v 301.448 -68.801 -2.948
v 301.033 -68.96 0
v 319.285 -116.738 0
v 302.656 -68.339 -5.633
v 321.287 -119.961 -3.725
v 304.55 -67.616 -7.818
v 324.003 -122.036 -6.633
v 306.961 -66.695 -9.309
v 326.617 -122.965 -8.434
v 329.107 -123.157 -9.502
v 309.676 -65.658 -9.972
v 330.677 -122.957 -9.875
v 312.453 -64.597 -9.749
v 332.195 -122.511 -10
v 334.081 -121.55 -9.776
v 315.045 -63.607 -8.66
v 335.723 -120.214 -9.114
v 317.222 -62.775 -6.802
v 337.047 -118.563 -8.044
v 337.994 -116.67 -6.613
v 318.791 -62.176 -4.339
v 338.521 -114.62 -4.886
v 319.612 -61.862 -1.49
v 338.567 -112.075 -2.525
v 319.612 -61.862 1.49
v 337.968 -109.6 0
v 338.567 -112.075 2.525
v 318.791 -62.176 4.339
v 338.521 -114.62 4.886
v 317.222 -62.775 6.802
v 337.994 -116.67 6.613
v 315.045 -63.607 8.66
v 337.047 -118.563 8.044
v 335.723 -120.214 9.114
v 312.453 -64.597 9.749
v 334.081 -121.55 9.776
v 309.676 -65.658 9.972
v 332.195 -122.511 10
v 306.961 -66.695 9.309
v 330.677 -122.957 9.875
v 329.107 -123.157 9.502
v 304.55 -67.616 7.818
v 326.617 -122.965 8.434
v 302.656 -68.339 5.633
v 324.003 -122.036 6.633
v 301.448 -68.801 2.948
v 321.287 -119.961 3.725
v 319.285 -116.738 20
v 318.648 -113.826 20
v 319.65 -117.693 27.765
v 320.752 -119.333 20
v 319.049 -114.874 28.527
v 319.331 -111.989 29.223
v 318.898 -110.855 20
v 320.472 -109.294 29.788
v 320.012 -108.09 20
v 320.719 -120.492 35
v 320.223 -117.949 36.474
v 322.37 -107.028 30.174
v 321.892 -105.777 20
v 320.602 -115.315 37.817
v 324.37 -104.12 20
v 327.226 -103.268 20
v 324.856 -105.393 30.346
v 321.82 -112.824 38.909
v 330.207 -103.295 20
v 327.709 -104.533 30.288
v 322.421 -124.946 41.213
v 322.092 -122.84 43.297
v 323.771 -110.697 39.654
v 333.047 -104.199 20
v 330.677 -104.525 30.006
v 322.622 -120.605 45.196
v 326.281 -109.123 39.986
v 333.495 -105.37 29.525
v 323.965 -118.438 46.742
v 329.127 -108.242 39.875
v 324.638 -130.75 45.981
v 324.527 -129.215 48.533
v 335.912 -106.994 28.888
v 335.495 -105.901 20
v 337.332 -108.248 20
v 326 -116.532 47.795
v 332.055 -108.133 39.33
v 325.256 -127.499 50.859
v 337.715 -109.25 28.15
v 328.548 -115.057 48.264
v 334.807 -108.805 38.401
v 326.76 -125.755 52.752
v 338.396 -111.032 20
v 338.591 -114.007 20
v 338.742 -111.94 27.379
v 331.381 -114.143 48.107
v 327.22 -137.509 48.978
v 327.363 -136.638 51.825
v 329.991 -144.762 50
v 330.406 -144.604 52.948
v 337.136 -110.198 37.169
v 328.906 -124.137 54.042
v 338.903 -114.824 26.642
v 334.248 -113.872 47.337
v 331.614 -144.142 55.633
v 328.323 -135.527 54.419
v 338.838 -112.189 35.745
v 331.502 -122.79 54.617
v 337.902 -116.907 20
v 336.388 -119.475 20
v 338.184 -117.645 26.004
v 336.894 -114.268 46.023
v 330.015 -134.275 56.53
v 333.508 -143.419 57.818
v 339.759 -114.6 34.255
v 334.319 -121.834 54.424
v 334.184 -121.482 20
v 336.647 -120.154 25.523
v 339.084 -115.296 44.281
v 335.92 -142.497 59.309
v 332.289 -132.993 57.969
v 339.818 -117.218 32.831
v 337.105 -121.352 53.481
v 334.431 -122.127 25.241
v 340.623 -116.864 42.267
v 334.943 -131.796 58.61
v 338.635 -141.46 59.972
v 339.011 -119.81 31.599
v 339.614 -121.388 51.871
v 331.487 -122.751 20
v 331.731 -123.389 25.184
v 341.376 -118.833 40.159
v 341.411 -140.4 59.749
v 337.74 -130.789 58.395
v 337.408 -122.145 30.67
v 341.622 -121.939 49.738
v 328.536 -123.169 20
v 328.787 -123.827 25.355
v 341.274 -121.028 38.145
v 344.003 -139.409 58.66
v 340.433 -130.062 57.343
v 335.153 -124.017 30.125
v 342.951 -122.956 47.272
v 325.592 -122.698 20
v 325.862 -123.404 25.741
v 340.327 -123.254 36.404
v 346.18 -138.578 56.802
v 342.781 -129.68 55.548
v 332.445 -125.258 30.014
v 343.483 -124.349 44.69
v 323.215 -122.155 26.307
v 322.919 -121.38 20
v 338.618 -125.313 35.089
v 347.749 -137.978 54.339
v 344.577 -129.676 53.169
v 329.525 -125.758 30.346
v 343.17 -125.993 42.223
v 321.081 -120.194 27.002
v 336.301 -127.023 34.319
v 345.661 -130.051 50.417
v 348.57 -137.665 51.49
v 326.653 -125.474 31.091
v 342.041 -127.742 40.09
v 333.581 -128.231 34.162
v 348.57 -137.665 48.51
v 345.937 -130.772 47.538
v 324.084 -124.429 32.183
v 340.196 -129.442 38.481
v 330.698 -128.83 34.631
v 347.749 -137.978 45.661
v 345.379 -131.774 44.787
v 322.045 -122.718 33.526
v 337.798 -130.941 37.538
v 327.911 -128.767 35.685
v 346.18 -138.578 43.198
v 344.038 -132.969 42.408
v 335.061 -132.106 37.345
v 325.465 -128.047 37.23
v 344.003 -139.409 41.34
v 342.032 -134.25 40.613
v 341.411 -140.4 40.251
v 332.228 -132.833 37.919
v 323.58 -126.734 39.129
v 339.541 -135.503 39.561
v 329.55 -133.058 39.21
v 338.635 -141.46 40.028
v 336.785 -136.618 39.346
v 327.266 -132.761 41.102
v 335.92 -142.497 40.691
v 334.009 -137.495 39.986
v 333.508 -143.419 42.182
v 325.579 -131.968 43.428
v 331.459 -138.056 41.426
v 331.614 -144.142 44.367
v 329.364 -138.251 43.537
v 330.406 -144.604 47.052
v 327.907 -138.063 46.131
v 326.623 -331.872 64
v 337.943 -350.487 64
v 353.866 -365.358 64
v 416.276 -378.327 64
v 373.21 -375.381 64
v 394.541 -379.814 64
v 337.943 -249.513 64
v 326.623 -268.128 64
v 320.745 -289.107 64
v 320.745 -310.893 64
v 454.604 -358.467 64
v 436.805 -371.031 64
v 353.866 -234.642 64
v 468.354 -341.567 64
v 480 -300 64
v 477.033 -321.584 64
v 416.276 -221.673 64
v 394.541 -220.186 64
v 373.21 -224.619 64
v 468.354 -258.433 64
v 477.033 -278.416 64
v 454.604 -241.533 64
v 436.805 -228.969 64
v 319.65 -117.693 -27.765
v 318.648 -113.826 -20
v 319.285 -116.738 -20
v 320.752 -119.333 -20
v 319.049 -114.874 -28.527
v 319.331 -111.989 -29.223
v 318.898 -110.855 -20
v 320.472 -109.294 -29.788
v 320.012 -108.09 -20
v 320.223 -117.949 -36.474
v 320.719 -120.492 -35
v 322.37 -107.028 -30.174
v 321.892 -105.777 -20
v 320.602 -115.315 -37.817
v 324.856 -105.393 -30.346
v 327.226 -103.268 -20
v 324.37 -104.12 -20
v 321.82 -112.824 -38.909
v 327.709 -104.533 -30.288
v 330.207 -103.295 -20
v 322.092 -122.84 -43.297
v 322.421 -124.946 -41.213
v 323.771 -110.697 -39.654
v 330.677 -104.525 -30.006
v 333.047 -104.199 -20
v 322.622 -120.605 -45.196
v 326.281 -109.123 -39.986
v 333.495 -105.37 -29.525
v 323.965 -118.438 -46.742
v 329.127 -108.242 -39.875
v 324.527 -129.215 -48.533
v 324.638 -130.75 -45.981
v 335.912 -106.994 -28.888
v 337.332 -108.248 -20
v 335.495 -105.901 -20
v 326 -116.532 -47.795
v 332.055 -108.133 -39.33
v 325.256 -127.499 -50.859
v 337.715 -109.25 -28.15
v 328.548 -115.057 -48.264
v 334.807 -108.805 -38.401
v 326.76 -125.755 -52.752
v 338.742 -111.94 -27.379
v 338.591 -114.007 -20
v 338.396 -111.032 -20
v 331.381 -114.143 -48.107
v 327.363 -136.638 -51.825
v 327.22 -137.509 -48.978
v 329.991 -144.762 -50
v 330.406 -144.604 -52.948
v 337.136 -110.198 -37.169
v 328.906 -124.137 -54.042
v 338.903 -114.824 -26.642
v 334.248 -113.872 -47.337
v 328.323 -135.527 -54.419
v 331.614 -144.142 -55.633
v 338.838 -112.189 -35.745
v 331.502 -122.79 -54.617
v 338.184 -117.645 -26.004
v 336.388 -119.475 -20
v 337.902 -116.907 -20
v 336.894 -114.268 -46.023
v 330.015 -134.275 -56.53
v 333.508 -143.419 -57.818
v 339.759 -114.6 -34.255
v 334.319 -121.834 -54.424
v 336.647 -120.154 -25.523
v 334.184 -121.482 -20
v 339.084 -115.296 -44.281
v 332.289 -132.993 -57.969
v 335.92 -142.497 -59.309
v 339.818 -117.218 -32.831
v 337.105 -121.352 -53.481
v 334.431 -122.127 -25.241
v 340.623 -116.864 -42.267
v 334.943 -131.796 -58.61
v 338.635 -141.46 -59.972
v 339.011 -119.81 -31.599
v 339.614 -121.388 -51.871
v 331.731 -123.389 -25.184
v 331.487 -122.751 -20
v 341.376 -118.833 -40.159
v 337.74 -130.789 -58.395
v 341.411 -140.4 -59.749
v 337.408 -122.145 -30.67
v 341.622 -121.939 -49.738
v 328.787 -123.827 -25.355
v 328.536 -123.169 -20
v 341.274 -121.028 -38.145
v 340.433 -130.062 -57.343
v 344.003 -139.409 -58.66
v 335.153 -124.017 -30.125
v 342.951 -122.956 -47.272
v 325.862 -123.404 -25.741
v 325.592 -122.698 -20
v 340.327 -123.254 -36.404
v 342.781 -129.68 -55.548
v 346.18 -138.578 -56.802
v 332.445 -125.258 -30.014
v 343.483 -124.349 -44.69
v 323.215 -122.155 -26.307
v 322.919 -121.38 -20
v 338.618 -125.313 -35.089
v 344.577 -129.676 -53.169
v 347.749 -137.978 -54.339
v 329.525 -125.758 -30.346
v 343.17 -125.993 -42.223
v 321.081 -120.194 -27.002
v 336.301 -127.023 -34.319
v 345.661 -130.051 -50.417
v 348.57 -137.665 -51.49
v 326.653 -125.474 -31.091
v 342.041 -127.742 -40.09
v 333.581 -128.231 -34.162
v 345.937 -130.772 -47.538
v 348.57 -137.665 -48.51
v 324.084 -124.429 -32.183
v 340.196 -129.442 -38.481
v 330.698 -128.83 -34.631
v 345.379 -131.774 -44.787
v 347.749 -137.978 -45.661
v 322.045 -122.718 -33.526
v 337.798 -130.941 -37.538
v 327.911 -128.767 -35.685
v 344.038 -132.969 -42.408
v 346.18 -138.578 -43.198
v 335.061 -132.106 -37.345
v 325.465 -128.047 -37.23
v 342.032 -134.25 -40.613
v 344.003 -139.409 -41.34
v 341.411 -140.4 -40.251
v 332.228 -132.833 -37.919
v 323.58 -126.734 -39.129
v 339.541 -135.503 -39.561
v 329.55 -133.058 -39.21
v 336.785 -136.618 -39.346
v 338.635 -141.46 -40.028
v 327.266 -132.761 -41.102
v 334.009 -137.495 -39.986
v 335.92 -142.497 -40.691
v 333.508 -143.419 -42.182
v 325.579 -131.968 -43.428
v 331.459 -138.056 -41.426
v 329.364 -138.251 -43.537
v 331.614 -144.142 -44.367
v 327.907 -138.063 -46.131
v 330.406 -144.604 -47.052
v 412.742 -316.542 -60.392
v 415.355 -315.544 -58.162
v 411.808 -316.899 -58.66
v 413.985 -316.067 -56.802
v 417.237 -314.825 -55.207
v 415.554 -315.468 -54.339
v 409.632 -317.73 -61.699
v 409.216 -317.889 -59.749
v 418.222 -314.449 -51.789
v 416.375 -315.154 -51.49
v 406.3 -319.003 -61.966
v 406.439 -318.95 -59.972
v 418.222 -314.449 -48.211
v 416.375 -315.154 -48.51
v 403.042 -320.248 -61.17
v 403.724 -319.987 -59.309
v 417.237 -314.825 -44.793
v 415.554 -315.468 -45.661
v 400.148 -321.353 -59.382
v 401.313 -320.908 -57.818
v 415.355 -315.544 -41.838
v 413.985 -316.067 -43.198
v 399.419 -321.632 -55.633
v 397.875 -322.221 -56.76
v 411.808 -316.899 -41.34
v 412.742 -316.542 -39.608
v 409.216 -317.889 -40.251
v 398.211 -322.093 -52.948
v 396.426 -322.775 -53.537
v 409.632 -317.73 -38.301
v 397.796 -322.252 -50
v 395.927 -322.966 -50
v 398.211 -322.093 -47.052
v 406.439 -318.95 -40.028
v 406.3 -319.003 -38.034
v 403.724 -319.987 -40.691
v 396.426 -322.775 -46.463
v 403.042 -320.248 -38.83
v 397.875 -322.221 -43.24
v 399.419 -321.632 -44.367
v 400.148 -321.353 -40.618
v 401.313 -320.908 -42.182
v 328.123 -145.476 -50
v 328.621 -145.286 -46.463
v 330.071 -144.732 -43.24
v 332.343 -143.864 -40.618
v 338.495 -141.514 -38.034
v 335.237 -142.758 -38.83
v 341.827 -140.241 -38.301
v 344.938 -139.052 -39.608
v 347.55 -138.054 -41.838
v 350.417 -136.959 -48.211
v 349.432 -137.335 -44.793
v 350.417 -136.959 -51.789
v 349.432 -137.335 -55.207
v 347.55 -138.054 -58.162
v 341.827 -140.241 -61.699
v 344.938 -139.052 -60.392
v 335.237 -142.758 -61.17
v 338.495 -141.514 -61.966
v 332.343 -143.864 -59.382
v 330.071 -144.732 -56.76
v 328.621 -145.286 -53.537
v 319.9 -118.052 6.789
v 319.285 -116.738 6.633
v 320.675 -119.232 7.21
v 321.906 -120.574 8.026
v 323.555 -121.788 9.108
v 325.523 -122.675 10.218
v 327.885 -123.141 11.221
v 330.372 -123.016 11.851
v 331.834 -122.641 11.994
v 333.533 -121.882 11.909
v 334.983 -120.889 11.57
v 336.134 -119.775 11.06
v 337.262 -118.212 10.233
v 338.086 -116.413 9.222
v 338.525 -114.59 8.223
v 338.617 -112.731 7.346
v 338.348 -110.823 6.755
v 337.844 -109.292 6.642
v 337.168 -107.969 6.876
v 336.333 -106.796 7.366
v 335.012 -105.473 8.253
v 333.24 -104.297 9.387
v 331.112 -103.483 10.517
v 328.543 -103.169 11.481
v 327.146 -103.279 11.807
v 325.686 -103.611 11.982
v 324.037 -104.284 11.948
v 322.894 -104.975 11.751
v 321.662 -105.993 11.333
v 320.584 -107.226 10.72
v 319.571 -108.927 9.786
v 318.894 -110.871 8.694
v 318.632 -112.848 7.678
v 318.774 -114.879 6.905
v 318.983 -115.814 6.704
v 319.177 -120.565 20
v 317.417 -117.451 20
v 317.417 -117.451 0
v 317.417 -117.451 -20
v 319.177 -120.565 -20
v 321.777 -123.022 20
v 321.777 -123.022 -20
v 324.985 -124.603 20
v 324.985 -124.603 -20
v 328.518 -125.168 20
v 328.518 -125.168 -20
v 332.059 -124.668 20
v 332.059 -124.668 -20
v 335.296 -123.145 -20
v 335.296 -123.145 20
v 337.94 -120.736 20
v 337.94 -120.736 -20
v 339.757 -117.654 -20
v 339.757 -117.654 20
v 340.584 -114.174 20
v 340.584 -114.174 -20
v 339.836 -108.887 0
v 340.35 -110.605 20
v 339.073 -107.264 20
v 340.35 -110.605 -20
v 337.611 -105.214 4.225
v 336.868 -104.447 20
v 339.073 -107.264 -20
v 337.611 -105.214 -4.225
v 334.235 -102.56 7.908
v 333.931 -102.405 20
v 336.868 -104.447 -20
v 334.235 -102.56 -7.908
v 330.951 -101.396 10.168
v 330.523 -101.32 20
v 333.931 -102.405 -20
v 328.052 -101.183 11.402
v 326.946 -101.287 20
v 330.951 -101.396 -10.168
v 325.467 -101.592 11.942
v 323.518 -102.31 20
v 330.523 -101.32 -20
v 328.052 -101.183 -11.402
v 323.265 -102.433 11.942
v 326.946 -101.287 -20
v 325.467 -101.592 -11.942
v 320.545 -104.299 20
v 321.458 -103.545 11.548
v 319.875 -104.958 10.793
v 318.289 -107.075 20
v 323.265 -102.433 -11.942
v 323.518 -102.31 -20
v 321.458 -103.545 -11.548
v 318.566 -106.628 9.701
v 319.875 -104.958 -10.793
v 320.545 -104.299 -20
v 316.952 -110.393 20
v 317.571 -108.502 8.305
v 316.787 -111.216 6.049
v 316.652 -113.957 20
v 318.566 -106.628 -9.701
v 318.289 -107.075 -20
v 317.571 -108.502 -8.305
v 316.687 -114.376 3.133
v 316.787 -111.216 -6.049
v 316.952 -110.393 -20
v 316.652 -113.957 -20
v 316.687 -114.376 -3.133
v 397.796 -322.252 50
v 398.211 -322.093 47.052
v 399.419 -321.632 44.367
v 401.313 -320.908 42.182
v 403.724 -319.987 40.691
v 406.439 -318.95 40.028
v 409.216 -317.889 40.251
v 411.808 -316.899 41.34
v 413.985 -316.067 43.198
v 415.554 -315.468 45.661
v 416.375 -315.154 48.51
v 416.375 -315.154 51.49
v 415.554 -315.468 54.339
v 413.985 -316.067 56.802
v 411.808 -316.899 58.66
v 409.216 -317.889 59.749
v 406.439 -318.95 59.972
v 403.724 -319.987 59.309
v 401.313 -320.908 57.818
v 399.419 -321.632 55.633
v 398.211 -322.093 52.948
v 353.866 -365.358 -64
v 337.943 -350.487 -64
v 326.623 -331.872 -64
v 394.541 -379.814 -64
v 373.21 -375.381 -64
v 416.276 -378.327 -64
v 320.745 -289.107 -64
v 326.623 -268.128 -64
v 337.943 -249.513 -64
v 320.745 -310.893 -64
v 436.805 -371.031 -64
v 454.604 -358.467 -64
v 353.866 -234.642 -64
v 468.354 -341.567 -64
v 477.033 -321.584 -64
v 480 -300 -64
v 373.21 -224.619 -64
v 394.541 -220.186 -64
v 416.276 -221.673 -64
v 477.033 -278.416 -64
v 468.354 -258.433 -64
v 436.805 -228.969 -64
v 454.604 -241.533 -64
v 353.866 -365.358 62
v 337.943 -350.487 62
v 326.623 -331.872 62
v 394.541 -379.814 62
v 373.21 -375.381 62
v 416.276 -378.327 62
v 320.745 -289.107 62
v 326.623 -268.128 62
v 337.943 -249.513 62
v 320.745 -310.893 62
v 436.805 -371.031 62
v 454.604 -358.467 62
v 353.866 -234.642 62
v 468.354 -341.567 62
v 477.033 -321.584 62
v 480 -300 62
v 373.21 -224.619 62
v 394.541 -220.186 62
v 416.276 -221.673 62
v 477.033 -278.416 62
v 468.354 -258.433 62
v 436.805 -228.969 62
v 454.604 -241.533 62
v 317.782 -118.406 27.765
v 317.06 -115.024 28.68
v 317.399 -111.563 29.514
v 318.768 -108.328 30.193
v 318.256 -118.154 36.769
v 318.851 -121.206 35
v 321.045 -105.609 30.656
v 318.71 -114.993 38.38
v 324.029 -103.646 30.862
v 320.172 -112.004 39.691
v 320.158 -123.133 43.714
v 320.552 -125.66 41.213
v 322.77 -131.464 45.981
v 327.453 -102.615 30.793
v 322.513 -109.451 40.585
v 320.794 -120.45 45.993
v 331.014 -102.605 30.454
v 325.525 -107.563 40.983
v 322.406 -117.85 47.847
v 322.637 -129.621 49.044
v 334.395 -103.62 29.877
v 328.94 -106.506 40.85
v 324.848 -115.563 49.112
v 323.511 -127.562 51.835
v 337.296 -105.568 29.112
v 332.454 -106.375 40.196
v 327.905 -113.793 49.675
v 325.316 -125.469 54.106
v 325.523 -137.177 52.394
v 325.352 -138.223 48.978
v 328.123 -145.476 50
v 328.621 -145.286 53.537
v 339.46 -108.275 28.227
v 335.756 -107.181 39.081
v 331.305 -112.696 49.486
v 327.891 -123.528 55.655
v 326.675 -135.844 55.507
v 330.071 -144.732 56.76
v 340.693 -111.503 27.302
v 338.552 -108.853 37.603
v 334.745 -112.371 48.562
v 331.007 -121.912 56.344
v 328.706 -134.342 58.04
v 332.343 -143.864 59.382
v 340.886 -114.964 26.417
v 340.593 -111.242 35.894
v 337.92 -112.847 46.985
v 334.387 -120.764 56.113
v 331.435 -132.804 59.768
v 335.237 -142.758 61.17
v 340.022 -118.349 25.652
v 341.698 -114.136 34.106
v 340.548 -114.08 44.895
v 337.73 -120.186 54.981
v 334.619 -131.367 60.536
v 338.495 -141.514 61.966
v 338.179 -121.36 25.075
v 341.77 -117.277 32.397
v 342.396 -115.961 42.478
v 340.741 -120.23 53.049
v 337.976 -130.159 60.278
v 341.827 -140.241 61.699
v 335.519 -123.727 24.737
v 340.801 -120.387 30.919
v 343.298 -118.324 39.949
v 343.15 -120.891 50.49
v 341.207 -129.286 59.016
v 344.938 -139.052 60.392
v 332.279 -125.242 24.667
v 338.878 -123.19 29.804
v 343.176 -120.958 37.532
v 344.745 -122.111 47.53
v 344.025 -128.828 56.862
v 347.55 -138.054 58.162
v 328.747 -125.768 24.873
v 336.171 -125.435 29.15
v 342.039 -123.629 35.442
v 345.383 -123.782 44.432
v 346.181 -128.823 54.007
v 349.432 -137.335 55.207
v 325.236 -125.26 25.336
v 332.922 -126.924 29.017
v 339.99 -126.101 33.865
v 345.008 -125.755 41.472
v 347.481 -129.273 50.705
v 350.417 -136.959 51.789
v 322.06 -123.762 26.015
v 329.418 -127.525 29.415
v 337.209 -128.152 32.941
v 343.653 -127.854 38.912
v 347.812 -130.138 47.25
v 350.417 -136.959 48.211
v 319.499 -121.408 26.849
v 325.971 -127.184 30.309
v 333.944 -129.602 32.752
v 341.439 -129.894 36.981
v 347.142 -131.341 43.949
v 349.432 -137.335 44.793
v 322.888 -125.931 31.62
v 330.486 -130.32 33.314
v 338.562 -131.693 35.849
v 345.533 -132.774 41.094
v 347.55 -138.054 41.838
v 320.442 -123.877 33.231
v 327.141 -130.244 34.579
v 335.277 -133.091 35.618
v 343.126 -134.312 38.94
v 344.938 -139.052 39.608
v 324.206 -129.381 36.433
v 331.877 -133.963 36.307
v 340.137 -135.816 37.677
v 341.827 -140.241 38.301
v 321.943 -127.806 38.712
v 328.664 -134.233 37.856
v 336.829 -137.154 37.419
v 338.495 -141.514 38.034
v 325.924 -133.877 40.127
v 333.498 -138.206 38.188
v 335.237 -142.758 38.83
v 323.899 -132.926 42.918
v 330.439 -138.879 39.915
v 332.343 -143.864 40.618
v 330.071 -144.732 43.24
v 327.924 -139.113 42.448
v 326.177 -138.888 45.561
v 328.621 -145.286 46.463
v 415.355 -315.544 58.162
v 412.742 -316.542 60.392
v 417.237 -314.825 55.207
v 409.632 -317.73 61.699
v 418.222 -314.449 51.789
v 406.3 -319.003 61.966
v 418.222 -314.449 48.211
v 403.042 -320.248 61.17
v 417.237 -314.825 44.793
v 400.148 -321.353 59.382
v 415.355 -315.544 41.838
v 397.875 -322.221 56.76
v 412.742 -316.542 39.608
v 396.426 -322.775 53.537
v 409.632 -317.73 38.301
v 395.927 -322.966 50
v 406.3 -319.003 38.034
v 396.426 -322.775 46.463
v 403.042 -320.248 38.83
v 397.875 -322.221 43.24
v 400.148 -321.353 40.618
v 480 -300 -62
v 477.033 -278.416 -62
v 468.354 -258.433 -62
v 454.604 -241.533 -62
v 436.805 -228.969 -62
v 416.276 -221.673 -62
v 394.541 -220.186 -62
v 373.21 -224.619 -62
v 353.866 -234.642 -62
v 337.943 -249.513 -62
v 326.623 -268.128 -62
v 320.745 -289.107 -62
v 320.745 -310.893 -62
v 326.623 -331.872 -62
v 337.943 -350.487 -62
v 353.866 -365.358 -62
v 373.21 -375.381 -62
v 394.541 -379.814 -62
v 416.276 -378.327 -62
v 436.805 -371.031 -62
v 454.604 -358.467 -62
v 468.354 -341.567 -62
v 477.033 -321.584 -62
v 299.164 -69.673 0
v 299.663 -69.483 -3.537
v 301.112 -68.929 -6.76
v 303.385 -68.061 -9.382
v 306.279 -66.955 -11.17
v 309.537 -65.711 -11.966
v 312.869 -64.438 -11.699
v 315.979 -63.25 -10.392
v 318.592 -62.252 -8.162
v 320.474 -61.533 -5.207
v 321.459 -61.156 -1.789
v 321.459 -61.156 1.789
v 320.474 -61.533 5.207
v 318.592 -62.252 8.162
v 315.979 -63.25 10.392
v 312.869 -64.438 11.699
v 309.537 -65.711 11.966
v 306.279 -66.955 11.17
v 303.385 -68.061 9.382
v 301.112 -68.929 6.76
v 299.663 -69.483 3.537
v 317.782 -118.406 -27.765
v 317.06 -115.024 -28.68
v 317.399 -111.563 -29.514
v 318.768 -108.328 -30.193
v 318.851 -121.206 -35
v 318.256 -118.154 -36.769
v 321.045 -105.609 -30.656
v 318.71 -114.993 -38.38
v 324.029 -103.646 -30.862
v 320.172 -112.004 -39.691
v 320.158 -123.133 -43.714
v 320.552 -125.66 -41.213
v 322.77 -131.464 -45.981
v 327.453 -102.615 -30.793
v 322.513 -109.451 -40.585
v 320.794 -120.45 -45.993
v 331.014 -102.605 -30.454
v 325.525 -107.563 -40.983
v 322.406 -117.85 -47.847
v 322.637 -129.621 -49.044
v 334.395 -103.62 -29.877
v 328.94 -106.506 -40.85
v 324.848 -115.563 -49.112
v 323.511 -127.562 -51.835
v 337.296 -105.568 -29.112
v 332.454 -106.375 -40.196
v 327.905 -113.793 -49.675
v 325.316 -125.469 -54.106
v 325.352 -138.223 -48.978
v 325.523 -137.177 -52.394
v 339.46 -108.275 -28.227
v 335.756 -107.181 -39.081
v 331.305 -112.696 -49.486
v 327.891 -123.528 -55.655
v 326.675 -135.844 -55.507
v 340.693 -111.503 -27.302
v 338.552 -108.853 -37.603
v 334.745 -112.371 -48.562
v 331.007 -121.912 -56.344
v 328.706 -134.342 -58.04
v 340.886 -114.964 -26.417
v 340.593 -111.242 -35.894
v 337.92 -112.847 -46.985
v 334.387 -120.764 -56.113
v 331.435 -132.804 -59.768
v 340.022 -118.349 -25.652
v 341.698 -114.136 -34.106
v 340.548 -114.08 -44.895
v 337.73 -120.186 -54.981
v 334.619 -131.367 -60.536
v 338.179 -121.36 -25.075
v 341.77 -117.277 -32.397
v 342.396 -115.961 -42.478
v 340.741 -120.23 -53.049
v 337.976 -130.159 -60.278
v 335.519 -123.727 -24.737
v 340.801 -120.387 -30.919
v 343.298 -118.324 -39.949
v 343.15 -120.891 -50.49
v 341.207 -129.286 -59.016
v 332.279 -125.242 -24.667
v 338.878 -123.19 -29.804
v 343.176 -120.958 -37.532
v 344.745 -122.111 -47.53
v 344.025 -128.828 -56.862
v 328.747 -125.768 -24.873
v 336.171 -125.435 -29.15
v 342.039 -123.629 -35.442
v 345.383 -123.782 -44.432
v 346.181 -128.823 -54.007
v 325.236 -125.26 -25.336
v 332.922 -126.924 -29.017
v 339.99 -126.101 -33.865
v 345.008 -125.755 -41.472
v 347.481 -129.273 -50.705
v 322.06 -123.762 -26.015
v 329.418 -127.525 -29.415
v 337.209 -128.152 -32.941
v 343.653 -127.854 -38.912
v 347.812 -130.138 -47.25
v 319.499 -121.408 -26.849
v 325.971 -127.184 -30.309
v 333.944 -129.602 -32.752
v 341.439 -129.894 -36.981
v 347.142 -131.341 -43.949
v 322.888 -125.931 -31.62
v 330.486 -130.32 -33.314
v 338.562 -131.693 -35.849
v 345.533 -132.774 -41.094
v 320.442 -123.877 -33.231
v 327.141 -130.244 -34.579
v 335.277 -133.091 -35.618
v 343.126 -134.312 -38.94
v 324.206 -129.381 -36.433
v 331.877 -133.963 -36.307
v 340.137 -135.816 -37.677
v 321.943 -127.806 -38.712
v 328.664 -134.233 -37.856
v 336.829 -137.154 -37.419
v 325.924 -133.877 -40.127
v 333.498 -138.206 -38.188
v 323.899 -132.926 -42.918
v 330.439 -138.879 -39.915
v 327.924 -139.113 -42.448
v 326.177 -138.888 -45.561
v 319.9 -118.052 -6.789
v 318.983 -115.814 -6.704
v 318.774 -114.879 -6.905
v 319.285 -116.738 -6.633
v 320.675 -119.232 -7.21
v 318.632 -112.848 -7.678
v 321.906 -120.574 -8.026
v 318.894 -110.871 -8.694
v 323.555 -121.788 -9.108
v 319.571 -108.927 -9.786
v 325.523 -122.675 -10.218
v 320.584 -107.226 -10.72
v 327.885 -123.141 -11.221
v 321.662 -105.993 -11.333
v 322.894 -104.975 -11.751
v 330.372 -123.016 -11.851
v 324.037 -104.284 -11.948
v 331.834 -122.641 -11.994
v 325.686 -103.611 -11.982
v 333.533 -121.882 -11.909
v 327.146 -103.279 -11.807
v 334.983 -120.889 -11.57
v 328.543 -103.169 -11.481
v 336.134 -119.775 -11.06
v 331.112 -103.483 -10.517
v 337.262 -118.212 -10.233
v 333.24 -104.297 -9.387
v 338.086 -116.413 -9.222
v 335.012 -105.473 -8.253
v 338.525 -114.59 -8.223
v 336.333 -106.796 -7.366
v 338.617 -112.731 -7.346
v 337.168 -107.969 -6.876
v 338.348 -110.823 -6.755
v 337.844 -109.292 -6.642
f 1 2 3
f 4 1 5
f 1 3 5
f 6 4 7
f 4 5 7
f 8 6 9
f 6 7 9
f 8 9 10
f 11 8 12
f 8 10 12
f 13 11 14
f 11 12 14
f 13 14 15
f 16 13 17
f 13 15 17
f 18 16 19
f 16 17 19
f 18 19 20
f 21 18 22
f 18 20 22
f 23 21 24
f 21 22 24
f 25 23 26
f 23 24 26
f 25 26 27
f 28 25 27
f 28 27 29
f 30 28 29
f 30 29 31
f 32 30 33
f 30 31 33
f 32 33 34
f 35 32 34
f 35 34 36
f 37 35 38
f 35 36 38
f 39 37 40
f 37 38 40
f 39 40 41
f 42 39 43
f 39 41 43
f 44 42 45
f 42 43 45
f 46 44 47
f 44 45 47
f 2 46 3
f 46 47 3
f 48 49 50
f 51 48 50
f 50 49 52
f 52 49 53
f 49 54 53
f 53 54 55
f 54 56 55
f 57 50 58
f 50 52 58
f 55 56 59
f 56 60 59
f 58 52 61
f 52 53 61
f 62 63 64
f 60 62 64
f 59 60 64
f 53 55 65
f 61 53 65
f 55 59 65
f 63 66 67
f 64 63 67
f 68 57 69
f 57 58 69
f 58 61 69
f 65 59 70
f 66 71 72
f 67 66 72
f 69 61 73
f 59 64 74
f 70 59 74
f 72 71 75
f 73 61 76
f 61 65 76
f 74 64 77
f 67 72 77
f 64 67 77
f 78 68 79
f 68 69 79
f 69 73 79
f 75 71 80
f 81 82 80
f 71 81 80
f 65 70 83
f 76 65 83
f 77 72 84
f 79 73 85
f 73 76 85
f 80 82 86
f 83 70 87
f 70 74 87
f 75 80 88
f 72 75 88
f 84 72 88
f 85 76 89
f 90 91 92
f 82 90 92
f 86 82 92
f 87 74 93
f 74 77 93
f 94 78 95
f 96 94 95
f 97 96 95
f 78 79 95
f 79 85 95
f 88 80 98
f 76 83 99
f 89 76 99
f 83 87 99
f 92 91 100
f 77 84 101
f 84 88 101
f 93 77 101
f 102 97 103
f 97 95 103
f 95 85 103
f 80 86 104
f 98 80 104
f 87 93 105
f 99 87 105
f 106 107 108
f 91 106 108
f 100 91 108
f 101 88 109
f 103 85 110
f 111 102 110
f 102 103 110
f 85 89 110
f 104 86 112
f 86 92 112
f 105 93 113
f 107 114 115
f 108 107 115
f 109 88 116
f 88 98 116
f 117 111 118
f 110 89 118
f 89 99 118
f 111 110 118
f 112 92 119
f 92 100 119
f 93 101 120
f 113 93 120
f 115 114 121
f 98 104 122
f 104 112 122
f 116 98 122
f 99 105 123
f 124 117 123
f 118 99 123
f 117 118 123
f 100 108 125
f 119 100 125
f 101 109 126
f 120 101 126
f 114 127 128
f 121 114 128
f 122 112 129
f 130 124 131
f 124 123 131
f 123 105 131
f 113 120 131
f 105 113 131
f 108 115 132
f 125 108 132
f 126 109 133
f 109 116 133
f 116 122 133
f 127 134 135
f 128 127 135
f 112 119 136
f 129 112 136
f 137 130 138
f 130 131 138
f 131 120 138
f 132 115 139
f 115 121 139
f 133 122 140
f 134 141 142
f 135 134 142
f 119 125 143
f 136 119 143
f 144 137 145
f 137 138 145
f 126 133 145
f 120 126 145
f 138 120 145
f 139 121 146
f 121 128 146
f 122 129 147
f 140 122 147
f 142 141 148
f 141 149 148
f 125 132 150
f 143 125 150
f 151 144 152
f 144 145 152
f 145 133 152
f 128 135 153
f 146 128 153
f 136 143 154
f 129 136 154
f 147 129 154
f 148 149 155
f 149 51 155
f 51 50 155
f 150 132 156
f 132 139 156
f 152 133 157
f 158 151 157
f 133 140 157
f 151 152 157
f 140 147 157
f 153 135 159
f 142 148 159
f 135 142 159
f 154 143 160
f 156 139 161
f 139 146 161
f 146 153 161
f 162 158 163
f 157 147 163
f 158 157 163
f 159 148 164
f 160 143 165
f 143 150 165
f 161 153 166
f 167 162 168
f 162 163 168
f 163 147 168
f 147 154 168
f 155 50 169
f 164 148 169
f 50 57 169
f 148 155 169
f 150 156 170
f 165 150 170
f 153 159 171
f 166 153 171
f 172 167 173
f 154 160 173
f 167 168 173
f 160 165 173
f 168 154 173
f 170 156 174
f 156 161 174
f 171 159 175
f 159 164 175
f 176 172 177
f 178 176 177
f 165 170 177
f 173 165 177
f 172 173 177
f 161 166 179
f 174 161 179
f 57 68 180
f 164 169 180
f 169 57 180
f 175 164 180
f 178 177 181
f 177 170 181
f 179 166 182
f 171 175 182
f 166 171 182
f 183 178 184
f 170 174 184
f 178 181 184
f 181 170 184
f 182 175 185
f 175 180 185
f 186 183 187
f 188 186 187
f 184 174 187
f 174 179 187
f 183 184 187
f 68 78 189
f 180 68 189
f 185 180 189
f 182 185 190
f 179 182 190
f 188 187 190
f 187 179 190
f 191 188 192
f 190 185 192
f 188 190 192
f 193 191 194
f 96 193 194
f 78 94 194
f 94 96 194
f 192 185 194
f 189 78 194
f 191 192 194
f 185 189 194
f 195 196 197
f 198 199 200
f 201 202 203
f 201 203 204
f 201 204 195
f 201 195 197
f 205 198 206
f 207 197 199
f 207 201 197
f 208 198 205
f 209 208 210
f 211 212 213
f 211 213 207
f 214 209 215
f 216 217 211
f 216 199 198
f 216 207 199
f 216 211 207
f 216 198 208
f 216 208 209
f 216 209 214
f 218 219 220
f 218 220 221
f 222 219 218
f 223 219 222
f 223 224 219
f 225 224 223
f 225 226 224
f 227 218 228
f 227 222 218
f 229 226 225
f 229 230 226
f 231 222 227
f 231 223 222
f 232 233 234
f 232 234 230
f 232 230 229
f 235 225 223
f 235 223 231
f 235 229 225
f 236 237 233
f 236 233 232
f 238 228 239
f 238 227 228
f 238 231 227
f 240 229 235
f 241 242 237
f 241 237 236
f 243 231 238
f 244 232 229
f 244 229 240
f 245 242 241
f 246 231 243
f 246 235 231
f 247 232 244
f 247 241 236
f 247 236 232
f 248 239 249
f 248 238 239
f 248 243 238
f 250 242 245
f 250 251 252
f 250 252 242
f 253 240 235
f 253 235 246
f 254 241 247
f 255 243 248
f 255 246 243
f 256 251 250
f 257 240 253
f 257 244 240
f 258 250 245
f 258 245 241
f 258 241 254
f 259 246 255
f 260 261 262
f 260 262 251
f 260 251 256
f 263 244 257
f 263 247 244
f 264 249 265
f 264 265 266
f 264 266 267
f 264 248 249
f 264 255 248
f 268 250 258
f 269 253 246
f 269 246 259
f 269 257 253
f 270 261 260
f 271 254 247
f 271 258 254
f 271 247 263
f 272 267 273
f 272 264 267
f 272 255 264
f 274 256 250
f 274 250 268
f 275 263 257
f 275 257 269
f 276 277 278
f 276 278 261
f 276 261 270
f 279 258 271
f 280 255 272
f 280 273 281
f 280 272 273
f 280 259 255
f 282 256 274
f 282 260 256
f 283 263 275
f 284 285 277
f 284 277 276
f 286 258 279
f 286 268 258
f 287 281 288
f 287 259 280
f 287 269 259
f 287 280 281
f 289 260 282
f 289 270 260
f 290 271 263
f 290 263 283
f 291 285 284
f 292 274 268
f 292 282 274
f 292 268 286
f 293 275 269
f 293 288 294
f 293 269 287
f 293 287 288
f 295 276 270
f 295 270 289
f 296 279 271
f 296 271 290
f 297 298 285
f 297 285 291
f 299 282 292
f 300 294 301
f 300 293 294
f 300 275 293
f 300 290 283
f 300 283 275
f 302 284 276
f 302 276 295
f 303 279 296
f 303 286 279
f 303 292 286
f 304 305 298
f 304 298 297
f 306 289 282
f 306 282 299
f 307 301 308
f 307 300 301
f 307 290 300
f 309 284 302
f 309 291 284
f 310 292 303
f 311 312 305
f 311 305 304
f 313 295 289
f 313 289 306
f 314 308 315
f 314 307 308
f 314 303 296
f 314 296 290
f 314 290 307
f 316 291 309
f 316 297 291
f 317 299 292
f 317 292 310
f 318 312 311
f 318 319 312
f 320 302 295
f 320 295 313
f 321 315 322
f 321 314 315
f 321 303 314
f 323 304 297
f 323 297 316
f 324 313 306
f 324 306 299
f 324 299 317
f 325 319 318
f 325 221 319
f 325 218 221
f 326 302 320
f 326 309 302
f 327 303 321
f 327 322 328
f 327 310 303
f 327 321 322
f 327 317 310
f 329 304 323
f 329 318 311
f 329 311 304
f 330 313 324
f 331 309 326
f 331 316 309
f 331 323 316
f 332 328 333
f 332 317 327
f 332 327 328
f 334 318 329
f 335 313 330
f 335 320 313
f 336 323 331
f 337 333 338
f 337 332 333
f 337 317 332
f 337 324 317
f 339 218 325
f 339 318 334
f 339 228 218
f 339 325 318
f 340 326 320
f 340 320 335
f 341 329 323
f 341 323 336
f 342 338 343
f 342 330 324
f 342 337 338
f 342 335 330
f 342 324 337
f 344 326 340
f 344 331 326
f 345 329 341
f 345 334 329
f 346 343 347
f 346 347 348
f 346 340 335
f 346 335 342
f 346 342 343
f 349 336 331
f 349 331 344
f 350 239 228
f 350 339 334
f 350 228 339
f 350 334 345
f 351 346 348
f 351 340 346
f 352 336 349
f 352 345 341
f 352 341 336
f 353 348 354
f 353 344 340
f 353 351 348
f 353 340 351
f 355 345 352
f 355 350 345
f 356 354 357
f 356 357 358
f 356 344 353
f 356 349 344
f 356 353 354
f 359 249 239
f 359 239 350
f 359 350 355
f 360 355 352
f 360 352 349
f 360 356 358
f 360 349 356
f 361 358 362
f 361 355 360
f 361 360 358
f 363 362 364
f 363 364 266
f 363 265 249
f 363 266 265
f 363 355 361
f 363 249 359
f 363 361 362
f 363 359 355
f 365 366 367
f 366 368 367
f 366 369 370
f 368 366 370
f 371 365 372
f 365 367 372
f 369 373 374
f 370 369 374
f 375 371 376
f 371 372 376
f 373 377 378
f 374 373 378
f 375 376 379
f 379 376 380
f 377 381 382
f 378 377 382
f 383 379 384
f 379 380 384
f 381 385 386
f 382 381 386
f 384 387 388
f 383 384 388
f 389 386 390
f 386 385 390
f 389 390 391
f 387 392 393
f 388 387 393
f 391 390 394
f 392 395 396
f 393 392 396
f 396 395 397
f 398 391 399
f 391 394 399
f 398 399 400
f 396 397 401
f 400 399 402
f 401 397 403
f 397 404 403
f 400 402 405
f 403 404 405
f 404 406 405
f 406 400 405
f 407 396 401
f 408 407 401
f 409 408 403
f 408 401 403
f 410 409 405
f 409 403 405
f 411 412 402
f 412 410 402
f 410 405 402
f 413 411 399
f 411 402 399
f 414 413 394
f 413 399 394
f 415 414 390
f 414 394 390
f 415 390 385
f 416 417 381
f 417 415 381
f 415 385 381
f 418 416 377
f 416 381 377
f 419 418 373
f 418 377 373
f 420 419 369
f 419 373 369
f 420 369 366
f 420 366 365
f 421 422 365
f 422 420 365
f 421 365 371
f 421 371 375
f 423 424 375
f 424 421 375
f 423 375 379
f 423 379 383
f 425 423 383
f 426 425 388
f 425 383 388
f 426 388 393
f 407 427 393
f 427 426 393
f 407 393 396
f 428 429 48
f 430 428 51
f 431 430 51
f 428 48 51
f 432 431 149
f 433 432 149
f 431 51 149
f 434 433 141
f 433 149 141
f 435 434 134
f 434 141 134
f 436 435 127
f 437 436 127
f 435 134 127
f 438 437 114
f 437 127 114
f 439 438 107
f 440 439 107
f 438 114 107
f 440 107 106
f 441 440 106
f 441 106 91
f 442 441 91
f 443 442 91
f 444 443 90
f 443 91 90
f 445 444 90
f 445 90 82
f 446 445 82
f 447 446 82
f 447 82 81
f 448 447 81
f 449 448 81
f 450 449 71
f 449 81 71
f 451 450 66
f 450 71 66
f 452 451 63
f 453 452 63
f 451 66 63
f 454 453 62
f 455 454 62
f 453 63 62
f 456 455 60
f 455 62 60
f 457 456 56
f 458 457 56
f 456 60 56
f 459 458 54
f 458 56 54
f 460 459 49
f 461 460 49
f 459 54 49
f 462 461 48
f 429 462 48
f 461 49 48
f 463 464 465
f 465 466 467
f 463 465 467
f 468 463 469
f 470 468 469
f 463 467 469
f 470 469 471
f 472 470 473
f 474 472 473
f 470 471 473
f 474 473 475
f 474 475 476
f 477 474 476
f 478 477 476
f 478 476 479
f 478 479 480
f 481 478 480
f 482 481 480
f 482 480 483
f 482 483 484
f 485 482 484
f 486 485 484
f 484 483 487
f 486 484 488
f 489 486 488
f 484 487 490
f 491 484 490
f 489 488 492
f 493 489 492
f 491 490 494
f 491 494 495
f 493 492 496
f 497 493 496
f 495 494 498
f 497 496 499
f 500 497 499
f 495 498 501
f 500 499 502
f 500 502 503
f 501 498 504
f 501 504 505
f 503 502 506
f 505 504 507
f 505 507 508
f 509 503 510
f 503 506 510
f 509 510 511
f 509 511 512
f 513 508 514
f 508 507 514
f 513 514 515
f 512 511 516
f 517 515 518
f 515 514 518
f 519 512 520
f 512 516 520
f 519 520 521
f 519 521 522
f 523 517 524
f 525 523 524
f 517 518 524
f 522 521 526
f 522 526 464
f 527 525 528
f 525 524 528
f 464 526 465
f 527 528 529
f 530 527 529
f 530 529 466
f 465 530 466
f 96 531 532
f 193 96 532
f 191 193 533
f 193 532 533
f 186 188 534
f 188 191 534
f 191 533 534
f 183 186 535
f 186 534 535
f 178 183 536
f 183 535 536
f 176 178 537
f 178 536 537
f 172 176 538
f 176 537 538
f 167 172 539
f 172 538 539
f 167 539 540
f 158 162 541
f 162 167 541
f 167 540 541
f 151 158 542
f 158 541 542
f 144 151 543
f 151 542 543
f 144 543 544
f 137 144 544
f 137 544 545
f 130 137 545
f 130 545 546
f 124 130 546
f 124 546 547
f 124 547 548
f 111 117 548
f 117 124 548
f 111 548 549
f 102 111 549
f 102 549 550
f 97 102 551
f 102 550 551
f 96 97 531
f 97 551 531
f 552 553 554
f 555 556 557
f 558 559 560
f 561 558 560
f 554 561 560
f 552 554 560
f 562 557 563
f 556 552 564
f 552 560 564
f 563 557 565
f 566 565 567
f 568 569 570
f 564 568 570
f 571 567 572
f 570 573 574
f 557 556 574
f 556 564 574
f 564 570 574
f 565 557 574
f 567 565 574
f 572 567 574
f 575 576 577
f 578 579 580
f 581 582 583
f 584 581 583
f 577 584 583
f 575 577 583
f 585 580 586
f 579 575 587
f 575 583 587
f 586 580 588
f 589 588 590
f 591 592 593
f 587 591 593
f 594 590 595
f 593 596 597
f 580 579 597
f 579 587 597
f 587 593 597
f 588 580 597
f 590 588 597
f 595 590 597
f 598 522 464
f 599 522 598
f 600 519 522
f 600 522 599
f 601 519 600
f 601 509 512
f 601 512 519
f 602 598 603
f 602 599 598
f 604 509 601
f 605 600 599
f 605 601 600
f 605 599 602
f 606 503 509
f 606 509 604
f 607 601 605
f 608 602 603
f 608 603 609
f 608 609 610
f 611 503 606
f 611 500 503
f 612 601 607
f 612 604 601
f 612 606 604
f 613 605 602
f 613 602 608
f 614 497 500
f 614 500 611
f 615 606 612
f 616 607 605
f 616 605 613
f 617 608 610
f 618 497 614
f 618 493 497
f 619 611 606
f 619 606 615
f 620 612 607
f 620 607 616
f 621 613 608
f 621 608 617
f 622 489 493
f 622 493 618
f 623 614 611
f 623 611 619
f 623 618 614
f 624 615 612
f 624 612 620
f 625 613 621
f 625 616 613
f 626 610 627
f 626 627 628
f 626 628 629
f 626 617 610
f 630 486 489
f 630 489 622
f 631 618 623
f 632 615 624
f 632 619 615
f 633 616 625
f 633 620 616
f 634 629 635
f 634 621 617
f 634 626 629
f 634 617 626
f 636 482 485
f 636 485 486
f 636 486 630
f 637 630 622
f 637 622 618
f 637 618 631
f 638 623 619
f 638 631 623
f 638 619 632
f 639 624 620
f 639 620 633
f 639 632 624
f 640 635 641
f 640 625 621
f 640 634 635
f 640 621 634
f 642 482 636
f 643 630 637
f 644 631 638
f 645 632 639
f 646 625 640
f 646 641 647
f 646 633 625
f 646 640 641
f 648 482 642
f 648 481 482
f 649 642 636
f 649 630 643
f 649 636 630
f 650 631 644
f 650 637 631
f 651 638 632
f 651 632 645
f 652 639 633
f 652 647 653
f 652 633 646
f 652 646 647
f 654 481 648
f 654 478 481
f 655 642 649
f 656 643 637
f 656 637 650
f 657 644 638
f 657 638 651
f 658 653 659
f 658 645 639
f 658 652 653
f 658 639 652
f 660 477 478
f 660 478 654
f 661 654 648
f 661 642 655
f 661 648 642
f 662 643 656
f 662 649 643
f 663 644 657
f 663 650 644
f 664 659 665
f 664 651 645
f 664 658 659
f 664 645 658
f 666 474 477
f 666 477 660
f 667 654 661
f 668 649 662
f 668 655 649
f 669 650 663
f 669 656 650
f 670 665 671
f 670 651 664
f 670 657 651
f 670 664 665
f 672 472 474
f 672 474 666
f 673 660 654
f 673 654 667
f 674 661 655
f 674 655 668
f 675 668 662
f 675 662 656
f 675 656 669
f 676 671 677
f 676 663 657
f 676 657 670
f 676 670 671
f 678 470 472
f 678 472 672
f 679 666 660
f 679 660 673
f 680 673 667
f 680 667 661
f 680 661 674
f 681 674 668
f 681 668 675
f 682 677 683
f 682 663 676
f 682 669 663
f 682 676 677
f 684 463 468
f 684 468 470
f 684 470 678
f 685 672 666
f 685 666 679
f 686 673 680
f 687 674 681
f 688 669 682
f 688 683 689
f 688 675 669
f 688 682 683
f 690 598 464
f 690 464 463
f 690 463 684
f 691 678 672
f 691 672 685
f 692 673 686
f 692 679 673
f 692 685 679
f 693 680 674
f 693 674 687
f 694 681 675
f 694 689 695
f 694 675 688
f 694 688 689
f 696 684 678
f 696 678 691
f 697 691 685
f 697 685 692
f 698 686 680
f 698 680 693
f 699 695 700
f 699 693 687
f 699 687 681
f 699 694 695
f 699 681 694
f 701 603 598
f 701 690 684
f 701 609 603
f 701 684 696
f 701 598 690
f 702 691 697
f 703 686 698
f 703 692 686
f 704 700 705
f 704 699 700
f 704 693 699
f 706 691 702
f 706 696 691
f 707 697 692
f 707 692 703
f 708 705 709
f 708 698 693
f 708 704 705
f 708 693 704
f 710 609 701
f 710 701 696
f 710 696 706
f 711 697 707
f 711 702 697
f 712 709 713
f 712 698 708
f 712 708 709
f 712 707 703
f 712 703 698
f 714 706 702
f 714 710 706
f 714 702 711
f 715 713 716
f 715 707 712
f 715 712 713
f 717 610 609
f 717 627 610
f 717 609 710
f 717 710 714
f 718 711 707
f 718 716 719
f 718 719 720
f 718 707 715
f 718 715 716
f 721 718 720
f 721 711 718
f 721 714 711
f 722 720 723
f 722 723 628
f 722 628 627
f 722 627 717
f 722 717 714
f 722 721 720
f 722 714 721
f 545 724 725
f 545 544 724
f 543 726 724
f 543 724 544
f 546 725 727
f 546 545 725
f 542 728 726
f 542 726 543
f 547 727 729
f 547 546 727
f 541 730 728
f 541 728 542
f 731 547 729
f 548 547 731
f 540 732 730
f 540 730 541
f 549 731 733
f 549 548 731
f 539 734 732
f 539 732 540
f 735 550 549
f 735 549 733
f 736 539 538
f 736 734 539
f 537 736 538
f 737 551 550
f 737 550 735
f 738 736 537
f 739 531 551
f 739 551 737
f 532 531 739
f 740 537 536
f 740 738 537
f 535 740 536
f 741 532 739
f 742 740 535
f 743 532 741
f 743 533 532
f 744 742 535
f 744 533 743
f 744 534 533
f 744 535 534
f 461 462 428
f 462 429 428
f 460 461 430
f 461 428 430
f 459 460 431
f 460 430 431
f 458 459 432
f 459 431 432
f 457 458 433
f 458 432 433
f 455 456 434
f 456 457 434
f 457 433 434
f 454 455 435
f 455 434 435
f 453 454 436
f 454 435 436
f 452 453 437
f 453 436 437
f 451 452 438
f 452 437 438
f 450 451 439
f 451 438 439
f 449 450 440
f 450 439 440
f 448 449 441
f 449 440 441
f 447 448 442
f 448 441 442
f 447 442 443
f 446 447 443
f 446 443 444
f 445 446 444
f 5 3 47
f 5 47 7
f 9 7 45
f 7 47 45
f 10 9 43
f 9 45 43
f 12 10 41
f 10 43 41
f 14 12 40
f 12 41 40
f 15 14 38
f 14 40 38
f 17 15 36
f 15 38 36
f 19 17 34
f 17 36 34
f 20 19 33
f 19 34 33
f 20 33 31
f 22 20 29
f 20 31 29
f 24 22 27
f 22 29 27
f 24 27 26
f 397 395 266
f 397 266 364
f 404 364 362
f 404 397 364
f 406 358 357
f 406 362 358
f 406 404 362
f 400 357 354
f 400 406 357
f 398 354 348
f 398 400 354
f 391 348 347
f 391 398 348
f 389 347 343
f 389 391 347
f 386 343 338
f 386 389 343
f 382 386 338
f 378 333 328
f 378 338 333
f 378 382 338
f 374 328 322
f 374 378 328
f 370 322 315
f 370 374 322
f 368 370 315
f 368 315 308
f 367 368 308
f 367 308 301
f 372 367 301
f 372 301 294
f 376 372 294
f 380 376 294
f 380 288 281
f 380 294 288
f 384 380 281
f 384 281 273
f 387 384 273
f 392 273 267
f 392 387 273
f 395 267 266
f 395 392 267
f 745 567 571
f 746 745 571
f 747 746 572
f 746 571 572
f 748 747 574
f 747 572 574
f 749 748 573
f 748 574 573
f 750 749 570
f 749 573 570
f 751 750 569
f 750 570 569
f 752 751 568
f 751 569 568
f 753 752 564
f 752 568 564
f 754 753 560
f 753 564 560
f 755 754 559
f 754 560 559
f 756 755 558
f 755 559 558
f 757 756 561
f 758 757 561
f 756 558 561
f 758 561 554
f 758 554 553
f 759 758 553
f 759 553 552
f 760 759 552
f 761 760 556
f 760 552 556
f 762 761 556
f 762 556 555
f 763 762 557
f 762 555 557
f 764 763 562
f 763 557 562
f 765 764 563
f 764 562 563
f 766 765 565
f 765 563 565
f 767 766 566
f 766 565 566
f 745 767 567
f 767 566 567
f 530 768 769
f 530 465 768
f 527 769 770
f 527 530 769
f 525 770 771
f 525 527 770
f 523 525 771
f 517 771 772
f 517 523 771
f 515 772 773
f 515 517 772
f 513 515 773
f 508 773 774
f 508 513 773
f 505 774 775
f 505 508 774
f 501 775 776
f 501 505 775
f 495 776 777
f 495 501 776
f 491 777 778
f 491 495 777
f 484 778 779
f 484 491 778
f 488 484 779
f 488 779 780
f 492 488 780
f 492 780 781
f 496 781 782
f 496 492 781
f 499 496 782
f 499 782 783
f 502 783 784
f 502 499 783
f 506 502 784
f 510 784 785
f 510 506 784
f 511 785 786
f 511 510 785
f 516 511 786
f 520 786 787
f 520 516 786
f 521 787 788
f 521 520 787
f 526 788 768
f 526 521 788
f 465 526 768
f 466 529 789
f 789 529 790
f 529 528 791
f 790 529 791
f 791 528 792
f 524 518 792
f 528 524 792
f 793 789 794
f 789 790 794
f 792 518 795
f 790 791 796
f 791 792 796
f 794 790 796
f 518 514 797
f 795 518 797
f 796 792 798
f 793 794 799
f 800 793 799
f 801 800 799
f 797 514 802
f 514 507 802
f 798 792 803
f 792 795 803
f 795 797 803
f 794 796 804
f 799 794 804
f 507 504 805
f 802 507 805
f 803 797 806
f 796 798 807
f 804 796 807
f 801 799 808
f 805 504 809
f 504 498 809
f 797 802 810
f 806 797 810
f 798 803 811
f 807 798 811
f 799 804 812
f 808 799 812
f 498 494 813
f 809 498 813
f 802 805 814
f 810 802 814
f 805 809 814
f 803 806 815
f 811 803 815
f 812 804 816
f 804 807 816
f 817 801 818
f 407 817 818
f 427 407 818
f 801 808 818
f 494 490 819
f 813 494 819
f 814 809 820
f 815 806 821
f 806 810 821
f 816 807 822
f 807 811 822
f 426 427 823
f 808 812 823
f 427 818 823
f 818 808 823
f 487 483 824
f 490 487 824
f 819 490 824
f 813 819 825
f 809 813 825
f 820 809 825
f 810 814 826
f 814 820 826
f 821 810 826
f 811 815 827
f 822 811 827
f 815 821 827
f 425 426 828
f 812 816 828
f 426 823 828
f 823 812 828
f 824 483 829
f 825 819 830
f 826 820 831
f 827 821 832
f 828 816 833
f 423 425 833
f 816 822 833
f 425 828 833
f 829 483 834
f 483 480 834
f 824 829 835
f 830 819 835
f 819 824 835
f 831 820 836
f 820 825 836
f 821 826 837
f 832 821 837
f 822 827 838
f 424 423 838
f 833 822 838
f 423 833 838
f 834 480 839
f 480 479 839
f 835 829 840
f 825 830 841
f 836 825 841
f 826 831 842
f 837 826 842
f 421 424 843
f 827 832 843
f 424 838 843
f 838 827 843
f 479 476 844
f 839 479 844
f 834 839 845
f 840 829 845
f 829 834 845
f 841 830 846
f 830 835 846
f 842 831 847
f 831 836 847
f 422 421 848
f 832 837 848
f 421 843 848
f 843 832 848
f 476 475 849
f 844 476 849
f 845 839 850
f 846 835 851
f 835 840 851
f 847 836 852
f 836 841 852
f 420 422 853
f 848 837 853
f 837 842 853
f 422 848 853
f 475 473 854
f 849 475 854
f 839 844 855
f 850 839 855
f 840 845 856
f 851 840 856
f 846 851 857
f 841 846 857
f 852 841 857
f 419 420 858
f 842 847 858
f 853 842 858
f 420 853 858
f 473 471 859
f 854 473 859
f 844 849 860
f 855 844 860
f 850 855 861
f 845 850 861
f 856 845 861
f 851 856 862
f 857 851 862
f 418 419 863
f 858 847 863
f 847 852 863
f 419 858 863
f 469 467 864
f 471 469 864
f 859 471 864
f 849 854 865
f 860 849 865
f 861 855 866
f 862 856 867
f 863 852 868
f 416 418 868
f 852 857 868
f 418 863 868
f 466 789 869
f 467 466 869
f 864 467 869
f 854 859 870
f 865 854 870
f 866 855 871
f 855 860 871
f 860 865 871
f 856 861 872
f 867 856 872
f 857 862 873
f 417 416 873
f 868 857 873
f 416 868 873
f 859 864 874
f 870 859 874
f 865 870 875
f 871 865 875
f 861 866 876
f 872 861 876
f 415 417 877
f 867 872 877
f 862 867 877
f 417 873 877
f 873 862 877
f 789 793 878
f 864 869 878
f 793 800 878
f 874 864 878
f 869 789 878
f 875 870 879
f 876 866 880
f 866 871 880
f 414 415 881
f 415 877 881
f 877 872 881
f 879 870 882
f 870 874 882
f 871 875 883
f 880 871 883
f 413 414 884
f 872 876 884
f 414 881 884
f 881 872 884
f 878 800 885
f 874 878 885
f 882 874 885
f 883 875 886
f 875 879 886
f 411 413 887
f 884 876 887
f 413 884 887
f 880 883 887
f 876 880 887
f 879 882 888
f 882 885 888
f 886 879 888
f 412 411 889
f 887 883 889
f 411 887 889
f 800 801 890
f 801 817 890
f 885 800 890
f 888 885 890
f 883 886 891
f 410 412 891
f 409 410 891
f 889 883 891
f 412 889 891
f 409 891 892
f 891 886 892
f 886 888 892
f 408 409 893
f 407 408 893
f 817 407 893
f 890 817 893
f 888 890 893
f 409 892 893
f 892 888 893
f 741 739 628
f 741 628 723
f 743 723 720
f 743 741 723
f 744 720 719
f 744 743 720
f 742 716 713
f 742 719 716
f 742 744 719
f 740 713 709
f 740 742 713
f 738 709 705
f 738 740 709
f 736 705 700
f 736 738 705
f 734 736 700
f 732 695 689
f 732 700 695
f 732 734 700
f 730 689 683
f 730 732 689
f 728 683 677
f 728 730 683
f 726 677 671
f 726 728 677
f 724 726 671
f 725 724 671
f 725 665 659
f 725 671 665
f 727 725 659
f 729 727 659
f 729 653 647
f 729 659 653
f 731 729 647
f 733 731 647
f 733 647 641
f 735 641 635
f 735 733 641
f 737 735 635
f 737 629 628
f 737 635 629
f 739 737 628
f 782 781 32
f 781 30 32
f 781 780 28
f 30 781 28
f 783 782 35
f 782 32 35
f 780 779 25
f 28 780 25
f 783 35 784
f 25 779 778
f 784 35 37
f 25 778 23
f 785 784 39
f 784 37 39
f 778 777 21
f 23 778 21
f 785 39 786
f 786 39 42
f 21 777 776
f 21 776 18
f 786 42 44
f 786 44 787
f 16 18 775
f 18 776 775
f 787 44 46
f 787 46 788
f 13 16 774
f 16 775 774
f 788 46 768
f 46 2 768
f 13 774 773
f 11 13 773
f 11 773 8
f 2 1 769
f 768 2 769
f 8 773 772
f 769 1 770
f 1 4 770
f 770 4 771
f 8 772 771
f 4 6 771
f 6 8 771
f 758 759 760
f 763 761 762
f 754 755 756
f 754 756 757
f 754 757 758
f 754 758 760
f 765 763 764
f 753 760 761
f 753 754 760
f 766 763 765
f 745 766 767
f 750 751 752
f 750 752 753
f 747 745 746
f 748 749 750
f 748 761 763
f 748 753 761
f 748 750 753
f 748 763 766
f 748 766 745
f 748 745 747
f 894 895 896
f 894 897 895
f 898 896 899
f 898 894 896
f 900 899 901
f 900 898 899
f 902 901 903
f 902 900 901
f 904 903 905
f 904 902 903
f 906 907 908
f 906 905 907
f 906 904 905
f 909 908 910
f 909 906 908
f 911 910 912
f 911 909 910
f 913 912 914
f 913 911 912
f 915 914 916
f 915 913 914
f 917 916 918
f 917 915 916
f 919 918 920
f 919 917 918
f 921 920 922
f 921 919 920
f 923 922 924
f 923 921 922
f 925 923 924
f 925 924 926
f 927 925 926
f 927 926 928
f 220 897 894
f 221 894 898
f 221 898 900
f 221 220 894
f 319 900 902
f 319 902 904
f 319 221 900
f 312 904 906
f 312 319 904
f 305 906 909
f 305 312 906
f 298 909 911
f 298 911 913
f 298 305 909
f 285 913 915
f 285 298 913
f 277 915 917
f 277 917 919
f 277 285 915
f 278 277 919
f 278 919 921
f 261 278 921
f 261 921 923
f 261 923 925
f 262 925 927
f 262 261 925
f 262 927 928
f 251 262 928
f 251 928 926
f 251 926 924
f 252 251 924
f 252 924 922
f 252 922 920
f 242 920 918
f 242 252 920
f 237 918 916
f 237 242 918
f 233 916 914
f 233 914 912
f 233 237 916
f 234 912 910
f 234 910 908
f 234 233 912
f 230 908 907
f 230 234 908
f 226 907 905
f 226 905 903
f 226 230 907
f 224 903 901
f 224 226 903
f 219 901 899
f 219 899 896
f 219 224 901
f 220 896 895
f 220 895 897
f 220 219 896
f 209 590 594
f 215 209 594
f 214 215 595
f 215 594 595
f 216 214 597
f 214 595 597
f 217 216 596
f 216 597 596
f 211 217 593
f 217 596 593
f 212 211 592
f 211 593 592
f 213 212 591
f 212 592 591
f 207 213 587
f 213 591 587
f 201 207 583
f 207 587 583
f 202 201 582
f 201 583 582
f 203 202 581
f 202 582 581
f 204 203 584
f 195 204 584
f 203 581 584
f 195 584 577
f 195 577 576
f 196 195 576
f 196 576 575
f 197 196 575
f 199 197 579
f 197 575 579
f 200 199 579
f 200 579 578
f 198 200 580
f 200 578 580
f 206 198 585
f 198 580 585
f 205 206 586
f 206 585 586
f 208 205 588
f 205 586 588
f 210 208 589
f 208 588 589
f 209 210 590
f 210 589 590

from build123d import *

# Parameters (mm, degrees)
SWEEP_THIN1_PROFILE_R   = 12
SWEEP_THIN1_PROFILE_R_2 = 10
THICKEN1_START          = -64
THICKEN1_OUTLINE_R      = 80
THICKEN1_DEPTH          = 2
THICKEN2_START          = 62
THICKEN2_OUTLINE_R      = 80
THICKEN2_DEPTH          = 2


# Read off the part's stored shape, not the designer's step: Thicken1, Thicken2
with BuildPart() as part:
    # Sweep-Thin1: sweep along a path in Sketch2
    with BuildLine(Plane(origin=(400.0000000000001, -300, 0), x_dir=(0, 0, -1), z_dir=(0.934155191329314, 0.35686703197758807, 0))) as sweep_thin1_path:
        Line((-3.67e-15, 251.14578261144848), (2.59e-15, 200.0000000000001))
        Line((2.59e-15, 200.0000000000001), (-20.000000000000004, 200.0000000000001))
        ThreePointArc((-20.000000000000004, 200.0000000000001), (-41.21320343559641, 191.21320343559654), (-49.999999999999986, 170.0000000000001))
        Line((-49.999999999999986, 170.0000000000001), (-49.99999999999998, -19.99999999999988))
    # Sweep-Thin1 profile (on start of the path) → Sweep-Thin1 (sweep)
    with BuildSketch(Plane(origin=(310.37434996576394, -65.39086339305203, 3.67e-15), x_dir=(-0.934155191329314, -0.35686703197758807, 0), z_dir=(0.35686703197758807, -0.934155191329314, 0))):
        Circle(SWEEP_THIN1_PROFILE_R)
        Circle(SWEEP_THIN1_PROFILE_R_2, mode=Mode.SUBTRACT)
    sweep_thin1 = sweep(path=sweep_thin1_path.line, transition=Transition.RIGHT)

    # Mirror1: Sweep-Thin1 across plane
    add(sweep_thin1.mirror(Plane.XY))


with BuildPart() as body_2:
    # Thicken1 outline → Thicken1 (new body)
    with BuildSketch(Plane.XY.offset(THICKEN1_START)):
        with Locations((400, -300)):
            Circle(THICKEN1_OUTLINE_R)
    extrude(amount=THICKEN1_DEPTH)


with BuildPart() as body_3:
    # Thicken2 outline → Thicken2 (new body)
    with BuildSketch(Plane.XY.offset(THICKEN2_START)):
        with Locations((400, -300)):
            Circle(THICKEN2_OUTLINE_R)
    extrude(amount=THICKEN2_DEPTH)


solid = Compound([part.part, body_2.part, body_3.part])
